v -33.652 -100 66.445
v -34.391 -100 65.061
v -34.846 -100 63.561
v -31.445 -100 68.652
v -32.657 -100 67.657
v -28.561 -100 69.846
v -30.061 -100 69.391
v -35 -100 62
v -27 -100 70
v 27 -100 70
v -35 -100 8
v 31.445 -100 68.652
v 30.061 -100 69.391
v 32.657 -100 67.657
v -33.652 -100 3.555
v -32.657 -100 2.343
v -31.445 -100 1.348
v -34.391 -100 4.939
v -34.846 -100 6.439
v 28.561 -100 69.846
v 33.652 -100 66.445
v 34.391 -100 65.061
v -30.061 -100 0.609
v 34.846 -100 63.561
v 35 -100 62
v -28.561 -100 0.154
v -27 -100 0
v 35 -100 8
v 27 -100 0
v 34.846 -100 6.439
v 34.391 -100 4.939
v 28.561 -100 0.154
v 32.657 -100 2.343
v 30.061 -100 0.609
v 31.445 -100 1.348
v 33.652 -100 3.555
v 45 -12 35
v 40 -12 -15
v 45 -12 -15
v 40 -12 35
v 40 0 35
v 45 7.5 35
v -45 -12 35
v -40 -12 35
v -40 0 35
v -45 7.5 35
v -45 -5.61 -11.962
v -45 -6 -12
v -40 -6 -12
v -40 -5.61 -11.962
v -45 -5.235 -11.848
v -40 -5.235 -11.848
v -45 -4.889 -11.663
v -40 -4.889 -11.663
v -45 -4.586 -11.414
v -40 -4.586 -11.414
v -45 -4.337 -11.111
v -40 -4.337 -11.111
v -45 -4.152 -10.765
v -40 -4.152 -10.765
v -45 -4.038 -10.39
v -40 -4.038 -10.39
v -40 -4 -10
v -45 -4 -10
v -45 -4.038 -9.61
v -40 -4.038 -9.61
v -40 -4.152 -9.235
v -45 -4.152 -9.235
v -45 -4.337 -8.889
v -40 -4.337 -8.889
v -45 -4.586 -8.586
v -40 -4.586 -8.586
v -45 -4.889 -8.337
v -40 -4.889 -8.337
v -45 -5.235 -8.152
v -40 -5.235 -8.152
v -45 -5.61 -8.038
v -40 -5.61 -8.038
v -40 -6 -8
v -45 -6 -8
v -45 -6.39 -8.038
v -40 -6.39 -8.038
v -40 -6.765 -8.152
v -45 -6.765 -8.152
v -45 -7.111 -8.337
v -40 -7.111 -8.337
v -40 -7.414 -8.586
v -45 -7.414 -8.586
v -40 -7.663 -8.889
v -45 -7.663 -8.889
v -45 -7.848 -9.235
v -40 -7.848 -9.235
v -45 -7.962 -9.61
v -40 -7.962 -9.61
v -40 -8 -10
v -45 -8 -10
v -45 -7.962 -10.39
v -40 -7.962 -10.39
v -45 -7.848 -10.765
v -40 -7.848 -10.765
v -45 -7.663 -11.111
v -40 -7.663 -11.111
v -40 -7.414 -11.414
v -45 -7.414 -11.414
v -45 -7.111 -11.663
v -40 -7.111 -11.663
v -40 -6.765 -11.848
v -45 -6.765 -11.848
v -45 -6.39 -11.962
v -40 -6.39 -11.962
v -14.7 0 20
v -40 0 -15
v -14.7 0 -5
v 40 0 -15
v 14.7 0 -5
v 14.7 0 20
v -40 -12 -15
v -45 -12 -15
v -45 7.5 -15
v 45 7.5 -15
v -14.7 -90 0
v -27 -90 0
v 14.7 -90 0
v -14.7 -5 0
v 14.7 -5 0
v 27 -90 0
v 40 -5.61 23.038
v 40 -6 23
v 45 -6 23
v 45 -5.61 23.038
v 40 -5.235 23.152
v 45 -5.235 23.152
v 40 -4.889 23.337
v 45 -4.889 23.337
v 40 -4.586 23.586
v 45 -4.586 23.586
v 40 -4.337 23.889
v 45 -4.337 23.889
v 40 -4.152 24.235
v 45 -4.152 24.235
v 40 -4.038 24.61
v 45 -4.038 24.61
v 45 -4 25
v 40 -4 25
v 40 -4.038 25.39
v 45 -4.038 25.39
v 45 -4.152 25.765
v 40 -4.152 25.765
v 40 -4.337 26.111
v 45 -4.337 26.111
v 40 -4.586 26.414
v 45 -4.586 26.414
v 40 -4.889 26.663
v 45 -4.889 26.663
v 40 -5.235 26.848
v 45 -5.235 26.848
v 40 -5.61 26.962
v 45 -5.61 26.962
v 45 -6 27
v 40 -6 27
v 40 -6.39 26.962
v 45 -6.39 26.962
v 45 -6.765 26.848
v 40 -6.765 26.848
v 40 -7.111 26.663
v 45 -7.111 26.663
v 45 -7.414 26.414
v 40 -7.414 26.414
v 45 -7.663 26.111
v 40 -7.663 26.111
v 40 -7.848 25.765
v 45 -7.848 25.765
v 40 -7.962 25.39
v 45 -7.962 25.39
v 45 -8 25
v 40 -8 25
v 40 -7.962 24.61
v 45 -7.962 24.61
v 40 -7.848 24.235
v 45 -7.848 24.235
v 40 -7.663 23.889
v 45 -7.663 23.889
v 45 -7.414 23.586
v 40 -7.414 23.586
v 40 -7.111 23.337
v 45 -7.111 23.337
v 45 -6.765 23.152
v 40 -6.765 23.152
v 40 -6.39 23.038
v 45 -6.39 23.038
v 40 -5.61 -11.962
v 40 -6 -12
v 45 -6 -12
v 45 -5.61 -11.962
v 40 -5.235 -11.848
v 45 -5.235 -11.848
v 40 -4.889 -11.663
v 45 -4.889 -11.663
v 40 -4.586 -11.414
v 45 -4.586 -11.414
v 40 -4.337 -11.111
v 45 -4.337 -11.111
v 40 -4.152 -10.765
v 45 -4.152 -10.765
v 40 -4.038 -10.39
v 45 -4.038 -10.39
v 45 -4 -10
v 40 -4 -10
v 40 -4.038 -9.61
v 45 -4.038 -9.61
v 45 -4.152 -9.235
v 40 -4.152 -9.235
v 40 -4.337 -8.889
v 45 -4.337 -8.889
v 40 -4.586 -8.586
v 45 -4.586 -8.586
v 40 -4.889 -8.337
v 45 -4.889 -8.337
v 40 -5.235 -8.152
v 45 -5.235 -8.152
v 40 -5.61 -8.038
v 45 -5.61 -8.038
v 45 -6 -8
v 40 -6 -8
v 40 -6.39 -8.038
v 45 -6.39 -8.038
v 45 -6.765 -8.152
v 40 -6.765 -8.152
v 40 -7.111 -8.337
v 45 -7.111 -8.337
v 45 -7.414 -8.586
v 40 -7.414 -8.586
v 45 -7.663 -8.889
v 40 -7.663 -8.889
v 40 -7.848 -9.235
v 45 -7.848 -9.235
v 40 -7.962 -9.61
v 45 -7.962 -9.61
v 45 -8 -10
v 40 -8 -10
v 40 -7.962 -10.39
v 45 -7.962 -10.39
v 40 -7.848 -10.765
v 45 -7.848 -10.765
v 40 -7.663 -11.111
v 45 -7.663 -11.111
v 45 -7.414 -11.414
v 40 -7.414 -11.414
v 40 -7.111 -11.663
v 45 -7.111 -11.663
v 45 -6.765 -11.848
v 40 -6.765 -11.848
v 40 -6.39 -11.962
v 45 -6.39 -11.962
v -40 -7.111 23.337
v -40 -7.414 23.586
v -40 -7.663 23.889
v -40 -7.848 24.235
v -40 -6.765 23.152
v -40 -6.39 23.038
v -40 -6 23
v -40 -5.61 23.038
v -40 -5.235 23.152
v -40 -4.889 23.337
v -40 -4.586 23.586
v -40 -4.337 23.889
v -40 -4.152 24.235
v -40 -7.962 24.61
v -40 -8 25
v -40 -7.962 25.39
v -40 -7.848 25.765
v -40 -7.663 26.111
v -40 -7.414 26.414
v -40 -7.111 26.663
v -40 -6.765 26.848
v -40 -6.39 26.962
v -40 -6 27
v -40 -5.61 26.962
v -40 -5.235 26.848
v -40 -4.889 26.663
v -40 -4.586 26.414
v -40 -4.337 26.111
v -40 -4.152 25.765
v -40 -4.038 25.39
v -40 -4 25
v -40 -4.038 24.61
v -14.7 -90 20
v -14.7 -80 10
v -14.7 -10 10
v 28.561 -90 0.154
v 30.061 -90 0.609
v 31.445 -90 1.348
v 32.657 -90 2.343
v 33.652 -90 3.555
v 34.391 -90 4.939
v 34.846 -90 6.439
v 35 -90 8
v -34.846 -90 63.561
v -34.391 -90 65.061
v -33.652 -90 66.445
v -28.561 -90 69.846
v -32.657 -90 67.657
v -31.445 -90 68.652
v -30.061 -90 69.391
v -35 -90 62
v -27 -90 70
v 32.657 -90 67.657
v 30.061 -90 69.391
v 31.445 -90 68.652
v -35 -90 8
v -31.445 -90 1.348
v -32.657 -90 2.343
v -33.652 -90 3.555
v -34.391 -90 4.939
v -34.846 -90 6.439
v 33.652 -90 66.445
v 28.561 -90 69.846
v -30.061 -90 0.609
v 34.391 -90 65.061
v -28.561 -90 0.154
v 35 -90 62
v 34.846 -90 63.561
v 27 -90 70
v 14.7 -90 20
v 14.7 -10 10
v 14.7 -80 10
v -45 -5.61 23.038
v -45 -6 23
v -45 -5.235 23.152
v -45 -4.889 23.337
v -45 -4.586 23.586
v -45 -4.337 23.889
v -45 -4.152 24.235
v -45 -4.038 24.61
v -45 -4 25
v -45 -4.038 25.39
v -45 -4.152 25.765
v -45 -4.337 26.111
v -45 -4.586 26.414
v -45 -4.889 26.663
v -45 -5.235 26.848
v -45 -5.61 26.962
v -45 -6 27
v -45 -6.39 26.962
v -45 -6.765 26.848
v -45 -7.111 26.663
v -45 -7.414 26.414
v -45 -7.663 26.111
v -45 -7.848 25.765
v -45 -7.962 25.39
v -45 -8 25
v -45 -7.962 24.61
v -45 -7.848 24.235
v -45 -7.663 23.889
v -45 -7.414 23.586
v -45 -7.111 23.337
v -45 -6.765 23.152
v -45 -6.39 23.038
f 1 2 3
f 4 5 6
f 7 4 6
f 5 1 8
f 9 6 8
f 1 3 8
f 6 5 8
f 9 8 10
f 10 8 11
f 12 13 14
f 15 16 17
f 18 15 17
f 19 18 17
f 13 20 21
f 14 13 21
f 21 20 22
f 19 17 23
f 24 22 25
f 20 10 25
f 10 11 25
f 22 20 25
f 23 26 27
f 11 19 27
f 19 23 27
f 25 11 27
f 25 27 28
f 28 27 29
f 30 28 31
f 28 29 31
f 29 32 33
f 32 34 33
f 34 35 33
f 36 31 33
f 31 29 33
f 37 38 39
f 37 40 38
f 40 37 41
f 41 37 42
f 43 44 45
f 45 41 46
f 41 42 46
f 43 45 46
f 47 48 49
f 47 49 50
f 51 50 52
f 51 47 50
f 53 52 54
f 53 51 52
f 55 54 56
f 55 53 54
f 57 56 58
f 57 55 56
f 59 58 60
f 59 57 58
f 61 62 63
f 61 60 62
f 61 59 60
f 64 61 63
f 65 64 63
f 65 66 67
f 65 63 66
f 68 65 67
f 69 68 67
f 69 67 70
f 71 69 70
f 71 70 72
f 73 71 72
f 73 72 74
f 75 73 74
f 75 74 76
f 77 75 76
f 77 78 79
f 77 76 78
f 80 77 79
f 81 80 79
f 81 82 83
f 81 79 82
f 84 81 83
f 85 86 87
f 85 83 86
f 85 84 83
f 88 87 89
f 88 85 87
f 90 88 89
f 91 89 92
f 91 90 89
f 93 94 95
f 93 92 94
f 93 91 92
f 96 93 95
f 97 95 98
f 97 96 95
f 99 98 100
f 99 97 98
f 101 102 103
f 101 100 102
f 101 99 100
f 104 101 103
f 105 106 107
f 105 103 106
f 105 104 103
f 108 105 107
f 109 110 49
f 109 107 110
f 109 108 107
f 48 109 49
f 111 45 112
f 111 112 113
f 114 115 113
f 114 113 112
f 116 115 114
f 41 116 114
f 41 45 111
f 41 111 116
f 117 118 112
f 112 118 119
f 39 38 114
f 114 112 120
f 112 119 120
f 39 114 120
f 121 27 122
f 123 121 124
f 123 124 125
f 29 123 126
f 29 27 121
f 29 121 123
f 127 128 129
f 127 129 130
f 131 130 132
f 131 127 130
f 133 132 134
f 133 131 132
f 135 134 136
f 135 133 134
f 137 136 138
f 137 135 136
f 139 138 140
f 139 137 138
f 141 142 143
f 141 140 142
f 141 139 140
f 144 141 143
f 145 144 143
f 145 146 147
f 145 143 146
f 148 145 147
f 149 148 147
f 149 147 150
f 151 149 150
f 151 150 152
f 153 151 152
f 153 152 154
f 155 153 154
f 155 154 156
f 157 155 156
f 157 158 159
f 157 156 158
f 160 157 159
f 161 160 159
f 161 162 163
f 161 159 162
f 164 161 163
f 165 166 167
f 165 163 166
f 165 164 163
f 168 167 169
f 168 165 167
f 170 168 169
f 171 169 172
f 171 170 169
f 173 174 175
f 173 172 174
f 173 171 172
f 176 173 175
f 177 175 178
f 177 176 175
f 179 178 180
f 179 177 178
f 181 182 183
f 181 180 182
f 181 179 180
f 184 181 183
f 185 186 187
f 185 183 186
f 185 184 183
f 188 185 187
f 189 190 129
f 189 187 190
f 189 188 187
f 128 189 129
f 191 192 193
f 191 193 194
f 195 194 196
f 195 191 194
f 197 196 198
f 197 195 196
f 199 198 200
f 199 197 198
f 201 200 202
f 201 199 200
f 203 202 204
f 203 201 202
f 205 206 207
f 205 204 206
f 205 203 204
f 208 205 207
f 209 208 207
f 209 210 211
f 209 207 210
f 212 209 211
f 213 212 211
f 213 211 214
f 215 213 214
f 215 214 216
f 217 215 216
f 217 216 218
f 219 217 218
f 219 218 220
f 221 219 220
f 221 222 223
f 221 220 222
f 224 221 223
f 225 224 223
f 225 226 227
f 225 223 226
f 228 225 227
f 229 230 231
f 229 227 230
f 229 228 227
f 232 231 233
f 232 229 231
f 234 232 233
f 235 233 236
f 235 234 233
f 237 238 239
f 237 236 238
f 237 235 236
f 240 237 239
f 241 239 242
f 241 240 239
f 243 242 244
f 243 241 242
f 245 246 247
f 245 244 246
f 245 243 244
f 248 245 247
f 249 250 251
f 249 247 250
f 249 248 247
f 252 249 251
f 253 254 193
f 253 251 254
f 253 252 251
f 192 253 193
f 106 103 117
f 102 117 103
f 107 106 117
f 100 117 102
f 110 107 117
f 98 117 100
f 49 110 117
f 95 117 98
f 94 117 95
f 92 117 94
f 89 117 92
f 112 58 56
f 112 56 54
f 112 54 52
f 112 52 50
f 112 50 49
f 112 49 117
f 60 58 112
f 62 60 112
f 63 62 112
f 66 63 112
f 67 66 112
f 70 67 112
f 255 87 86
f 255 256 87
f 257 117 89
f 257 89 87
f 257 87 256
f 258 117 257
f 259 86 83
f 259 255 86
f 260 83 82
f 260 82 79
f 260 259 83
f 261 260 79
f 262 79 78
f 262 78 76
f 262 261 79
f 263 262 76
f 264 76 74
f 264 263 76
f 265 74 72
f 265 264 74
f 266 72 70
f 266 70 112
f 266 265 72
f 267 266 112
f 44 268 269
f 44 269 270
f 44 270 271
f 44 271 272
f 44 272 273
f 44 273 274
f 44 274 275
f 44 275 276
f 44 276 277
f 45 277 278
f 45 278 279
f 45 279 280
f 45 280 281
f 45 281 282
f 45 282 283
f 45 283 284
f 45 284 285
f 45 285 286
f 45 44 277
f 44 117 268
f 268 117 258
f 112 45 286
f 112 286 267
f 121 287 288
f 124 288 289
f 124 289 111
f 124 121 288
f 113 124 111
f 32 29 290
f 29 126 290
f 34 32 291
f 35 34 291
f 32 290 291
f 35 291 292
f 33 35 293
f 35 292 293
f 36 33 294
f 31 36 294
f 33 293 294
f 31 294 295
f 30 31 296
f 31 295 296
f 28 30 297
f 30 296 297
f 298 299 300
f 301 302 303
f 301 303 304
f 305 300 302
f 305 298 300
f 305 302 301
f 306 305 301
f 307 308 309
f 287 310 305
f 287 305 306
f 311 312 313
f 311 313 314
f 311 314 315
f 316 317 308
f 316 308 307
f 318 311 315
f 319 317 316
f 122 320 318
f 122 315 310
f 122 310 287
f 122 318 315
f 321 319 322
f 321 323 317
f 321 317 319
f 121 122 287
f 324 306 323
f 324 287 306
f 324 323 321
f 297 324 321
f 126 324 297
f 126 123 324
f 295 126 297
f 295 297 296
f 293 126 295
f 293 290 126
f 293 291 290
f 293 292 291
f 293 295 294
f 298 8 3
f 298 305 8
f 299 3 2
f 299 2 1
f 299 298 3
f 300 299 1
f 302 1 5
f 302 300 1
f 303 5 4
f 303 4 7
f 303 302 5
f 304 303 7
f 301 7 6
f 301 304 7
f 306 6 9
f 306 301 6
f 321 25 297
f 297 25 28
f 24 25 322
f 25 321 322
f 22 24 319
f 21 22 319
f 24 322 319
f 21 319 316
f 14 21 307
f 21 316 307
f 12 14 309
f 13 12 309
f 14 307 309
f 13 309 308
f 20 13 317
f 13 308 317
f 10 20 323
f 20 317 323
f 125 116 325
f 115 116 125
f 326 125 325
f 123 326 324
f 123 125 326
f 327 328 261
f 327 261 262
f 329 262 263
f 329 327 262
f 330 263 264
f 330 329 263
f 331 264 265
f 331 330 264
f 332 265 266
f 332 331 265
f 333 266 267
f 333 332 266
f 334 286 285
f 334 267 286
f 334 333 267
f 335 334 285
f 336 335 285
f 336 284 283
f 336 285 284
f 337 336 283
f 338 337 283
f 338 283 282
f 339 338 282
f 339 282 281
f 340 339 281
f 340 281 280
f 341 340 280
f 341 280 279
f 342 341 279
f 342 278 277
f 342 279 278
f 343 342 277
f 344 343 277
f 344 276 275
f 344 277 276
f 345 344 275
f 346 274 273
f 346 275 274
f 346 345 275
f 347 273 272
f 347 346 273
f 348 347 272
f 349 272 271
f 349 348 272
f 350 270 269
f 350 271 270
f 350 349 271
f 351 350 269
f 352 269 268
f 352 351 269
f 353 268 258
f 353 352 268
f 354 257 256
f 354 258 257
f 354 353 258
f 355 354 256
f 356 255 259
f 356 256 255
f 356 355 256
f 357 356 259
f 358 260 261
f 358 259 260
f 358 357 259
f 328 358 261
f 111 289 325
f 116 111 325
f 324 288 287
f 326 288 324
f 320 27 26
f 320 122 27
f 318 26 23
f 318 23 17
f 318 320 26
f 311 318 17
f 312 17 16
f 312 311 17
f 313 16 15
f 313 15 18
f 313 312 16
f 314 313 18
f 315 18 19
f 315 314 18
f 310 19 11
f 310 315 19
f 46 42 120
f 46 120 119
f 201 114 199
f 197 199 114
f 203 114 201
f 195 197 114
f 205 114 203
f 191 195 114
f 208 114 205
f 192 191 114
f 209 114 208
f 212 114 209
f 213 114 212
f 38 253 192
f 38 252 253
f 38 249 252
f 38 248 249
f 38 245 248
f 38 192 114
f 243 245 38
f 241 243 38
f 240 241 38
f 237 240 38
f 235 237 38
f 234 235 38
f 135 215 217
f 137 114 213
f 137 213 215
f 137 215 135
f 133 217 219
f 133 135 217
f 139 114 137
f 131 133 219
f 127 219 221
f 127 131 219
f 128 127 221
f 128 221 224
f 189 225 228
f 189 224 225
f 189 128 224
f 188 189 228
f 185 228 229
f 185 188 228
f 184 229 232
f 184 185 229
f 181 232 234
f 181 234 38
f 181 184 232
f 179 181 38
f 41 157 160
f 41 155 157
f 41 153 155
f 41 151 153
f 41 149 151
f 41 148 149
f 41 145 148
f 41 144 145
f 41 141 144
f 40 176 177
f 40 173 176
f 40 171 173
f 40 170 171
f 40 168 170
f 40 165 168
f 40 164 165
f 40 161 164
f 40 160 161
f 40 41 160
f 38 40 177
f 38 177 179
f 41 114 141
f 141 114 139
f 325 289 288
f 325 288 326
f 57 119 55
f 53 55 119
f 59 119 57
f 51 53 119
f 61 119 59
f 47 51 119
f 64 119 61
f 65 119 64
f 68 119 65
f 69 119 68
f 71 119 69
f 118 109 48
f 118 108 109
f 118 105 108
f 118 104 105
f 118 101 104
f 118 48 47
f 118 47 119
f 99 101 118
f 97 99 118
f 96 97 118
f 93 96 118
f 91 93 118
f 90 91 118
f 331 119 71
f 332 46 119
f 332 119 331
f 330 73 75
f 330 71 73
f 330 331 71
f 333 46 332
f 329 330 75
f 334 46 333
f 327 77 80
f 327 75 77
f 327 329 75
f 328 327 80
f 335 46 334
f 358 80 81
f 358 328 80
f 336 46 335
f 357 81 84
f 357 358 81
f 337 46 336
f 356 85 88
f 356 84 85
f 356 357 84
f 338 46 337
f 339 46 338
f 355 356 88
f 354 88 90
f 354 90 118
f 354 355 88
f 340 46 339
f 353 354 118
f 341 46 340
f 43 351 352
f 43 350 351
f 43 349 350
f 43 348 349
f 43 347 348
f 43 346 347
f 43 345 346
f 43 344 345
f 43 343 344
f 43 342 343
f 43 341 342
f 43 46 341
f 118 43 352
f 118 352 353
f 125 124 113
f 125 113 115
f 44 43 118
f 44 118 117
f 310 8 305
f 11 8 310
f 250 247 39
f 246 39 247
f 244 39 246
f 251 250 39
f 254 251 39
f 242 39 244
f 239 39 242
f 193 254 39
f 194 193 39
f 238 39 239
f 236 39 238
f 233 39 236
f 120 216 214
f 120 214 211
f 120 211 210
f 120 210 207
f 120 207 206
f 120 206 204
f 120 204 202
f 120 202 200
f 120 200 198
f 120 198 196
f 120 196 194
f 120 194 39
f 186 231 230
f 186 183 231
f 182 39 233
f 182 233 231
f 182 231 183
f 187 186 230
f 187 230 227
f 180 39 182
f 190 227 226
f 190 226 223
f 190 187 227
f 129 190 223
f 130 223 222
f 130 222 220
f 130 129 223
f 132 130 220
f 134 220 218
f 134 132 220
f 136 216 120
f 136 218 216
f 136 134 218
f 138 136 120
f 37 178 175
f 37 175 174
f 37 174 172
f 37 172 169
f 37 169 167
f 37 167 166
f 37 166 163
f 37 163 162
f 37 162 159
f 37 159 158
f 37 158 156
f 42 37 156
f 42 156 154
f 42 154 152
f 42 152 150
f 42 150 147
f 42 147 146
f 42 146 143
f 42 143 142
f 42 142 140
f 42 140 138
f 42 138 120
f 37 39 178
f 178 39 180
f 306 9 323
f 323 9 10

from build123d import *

# Parameters (mm, degrees)
EXTRUDE_2_DEPTH          = 35
EXTRUDE_START            = -100
SKETCH_3_W               = 70
SKETCH_3_H               = 70
EXTRUDE_3_DEPTH          = 10
CUT_EXTRUDE_START        = 35
SKETCH_4_W               = 29.4
SKETCH_4_H               = 90
CUT_EXTRUDE_1_DEPTH      = 25
CHAMFER_1_SIZE           = 10
EXTRUDE_4_DEPTH          = 15
CHAMFER_2_SIZE           = 5
CUT_EXTRUDE_2_DEPTH      = 131.096118313
CUT_EXTRUDE_2_DEPTH_BACK = 131.096118313
SKETCH_6_R               = 2
FILLET_2_R               = 8


with BuildPart() as part:
    # 草图2 → 凸台-拉伸2 (new body)
    with BuildSketch(Plane.XY):
        Polygon((-45, 7.5), (45, 7.5), (45, -12), (40, -12), (40, 0), (14.7, 0), (14.7, -100), (-14.7, -100), (-14.7, 0), (-40, 0), (-40, -12), (-45, -12), align=None)
    extrude(amount=EXTRUDE_2_DEPTH)

    # 草图3 → 凸台-拉伸3 (add)
    with BuildSketch(Plane(origin=(0, 0, 0), x_dir=(1, 0, 0), z_dir=(0, 1, 0)).offset(EXTRUDE_START)):
        with Locations((0, -35)):
            Rectangle(SKETCH_3_W, SKETCH_3_H)
    extrude(amount=EXTRUDE_3_DEPTH)

    # 草图4 → 切除-拉伸1 (cut)
    with BuildSketch(Plane.XY.offset(CUT_EXTRUDE_START)):
        with Locations((0, -45)):
            Rectangle(SKETCH_4_W, SKETCH_4_H)
    extrude(amount=-CUT_EXTRUDE_1_DEPTH, mode=Mode.SUBTRACT)

    # 倒角1
    chamfer_1_edges = [part.edges().sort_by_distance(p)[0] for p in [
        (0, 0, 10),
        (0, -90, 10),
    ]]
    chamfer(chamfer_1_edges, length=CHAMFER_1_SIZE)

    # 草图5 → 凸台-拉伸4 (add)
    with BuildSketch(Plane.XY):
        Polygon((40, -12), (45, -12), (45, 7.5), (-45, 7.5), (-45, -12), (-40, -12), (-40, 0), (40, 0), align=None)
    extrude(amount=-EXTRUDE_4_DEPTH)

    # 倒角2
    chamfer_2_edges = [part.edges().sort_by_distance(p)[0] for p in [
        (0, 0, 0),
    ]]
    chamfer(chamfer_2_edges, length=CHAMFER_2_SIZE)

    # 草图6 → 切除-拉伸2 (cut, two sides: drawn at the far end of the back side and taken through both)
    with BuildSketch(Plane(origin=(0, 0, 0), x_dir=(0, 0, -1), z_dir=(1, 0, 0)).offset(-CUT_EXTRUDE_2_DEPTH_BACK)):
        with Locations((10, -6)):
            Circle(SKETCH_6_R)
        with Locations((-25, -6)):
            Circle(SKETCH_6_R)
    extrude(amount=CUT_EXTRUDE_2_DEPTH + CUT_EXTRUDE_2_DEPTH_BACK, mode=Mode.SUBTRACT)

    # 圆角2
    fillet_2_edges = [part.edges().sort_by_distance(p)[0] for p in [
        (35, -95, 0),
        (-35, -95, 0),
        (-35, -95, 70),
        (35, -95, 70),
    ]]
    fillet(fillet_2_edges, radius=FILLET_2_R)


solid = part.part
